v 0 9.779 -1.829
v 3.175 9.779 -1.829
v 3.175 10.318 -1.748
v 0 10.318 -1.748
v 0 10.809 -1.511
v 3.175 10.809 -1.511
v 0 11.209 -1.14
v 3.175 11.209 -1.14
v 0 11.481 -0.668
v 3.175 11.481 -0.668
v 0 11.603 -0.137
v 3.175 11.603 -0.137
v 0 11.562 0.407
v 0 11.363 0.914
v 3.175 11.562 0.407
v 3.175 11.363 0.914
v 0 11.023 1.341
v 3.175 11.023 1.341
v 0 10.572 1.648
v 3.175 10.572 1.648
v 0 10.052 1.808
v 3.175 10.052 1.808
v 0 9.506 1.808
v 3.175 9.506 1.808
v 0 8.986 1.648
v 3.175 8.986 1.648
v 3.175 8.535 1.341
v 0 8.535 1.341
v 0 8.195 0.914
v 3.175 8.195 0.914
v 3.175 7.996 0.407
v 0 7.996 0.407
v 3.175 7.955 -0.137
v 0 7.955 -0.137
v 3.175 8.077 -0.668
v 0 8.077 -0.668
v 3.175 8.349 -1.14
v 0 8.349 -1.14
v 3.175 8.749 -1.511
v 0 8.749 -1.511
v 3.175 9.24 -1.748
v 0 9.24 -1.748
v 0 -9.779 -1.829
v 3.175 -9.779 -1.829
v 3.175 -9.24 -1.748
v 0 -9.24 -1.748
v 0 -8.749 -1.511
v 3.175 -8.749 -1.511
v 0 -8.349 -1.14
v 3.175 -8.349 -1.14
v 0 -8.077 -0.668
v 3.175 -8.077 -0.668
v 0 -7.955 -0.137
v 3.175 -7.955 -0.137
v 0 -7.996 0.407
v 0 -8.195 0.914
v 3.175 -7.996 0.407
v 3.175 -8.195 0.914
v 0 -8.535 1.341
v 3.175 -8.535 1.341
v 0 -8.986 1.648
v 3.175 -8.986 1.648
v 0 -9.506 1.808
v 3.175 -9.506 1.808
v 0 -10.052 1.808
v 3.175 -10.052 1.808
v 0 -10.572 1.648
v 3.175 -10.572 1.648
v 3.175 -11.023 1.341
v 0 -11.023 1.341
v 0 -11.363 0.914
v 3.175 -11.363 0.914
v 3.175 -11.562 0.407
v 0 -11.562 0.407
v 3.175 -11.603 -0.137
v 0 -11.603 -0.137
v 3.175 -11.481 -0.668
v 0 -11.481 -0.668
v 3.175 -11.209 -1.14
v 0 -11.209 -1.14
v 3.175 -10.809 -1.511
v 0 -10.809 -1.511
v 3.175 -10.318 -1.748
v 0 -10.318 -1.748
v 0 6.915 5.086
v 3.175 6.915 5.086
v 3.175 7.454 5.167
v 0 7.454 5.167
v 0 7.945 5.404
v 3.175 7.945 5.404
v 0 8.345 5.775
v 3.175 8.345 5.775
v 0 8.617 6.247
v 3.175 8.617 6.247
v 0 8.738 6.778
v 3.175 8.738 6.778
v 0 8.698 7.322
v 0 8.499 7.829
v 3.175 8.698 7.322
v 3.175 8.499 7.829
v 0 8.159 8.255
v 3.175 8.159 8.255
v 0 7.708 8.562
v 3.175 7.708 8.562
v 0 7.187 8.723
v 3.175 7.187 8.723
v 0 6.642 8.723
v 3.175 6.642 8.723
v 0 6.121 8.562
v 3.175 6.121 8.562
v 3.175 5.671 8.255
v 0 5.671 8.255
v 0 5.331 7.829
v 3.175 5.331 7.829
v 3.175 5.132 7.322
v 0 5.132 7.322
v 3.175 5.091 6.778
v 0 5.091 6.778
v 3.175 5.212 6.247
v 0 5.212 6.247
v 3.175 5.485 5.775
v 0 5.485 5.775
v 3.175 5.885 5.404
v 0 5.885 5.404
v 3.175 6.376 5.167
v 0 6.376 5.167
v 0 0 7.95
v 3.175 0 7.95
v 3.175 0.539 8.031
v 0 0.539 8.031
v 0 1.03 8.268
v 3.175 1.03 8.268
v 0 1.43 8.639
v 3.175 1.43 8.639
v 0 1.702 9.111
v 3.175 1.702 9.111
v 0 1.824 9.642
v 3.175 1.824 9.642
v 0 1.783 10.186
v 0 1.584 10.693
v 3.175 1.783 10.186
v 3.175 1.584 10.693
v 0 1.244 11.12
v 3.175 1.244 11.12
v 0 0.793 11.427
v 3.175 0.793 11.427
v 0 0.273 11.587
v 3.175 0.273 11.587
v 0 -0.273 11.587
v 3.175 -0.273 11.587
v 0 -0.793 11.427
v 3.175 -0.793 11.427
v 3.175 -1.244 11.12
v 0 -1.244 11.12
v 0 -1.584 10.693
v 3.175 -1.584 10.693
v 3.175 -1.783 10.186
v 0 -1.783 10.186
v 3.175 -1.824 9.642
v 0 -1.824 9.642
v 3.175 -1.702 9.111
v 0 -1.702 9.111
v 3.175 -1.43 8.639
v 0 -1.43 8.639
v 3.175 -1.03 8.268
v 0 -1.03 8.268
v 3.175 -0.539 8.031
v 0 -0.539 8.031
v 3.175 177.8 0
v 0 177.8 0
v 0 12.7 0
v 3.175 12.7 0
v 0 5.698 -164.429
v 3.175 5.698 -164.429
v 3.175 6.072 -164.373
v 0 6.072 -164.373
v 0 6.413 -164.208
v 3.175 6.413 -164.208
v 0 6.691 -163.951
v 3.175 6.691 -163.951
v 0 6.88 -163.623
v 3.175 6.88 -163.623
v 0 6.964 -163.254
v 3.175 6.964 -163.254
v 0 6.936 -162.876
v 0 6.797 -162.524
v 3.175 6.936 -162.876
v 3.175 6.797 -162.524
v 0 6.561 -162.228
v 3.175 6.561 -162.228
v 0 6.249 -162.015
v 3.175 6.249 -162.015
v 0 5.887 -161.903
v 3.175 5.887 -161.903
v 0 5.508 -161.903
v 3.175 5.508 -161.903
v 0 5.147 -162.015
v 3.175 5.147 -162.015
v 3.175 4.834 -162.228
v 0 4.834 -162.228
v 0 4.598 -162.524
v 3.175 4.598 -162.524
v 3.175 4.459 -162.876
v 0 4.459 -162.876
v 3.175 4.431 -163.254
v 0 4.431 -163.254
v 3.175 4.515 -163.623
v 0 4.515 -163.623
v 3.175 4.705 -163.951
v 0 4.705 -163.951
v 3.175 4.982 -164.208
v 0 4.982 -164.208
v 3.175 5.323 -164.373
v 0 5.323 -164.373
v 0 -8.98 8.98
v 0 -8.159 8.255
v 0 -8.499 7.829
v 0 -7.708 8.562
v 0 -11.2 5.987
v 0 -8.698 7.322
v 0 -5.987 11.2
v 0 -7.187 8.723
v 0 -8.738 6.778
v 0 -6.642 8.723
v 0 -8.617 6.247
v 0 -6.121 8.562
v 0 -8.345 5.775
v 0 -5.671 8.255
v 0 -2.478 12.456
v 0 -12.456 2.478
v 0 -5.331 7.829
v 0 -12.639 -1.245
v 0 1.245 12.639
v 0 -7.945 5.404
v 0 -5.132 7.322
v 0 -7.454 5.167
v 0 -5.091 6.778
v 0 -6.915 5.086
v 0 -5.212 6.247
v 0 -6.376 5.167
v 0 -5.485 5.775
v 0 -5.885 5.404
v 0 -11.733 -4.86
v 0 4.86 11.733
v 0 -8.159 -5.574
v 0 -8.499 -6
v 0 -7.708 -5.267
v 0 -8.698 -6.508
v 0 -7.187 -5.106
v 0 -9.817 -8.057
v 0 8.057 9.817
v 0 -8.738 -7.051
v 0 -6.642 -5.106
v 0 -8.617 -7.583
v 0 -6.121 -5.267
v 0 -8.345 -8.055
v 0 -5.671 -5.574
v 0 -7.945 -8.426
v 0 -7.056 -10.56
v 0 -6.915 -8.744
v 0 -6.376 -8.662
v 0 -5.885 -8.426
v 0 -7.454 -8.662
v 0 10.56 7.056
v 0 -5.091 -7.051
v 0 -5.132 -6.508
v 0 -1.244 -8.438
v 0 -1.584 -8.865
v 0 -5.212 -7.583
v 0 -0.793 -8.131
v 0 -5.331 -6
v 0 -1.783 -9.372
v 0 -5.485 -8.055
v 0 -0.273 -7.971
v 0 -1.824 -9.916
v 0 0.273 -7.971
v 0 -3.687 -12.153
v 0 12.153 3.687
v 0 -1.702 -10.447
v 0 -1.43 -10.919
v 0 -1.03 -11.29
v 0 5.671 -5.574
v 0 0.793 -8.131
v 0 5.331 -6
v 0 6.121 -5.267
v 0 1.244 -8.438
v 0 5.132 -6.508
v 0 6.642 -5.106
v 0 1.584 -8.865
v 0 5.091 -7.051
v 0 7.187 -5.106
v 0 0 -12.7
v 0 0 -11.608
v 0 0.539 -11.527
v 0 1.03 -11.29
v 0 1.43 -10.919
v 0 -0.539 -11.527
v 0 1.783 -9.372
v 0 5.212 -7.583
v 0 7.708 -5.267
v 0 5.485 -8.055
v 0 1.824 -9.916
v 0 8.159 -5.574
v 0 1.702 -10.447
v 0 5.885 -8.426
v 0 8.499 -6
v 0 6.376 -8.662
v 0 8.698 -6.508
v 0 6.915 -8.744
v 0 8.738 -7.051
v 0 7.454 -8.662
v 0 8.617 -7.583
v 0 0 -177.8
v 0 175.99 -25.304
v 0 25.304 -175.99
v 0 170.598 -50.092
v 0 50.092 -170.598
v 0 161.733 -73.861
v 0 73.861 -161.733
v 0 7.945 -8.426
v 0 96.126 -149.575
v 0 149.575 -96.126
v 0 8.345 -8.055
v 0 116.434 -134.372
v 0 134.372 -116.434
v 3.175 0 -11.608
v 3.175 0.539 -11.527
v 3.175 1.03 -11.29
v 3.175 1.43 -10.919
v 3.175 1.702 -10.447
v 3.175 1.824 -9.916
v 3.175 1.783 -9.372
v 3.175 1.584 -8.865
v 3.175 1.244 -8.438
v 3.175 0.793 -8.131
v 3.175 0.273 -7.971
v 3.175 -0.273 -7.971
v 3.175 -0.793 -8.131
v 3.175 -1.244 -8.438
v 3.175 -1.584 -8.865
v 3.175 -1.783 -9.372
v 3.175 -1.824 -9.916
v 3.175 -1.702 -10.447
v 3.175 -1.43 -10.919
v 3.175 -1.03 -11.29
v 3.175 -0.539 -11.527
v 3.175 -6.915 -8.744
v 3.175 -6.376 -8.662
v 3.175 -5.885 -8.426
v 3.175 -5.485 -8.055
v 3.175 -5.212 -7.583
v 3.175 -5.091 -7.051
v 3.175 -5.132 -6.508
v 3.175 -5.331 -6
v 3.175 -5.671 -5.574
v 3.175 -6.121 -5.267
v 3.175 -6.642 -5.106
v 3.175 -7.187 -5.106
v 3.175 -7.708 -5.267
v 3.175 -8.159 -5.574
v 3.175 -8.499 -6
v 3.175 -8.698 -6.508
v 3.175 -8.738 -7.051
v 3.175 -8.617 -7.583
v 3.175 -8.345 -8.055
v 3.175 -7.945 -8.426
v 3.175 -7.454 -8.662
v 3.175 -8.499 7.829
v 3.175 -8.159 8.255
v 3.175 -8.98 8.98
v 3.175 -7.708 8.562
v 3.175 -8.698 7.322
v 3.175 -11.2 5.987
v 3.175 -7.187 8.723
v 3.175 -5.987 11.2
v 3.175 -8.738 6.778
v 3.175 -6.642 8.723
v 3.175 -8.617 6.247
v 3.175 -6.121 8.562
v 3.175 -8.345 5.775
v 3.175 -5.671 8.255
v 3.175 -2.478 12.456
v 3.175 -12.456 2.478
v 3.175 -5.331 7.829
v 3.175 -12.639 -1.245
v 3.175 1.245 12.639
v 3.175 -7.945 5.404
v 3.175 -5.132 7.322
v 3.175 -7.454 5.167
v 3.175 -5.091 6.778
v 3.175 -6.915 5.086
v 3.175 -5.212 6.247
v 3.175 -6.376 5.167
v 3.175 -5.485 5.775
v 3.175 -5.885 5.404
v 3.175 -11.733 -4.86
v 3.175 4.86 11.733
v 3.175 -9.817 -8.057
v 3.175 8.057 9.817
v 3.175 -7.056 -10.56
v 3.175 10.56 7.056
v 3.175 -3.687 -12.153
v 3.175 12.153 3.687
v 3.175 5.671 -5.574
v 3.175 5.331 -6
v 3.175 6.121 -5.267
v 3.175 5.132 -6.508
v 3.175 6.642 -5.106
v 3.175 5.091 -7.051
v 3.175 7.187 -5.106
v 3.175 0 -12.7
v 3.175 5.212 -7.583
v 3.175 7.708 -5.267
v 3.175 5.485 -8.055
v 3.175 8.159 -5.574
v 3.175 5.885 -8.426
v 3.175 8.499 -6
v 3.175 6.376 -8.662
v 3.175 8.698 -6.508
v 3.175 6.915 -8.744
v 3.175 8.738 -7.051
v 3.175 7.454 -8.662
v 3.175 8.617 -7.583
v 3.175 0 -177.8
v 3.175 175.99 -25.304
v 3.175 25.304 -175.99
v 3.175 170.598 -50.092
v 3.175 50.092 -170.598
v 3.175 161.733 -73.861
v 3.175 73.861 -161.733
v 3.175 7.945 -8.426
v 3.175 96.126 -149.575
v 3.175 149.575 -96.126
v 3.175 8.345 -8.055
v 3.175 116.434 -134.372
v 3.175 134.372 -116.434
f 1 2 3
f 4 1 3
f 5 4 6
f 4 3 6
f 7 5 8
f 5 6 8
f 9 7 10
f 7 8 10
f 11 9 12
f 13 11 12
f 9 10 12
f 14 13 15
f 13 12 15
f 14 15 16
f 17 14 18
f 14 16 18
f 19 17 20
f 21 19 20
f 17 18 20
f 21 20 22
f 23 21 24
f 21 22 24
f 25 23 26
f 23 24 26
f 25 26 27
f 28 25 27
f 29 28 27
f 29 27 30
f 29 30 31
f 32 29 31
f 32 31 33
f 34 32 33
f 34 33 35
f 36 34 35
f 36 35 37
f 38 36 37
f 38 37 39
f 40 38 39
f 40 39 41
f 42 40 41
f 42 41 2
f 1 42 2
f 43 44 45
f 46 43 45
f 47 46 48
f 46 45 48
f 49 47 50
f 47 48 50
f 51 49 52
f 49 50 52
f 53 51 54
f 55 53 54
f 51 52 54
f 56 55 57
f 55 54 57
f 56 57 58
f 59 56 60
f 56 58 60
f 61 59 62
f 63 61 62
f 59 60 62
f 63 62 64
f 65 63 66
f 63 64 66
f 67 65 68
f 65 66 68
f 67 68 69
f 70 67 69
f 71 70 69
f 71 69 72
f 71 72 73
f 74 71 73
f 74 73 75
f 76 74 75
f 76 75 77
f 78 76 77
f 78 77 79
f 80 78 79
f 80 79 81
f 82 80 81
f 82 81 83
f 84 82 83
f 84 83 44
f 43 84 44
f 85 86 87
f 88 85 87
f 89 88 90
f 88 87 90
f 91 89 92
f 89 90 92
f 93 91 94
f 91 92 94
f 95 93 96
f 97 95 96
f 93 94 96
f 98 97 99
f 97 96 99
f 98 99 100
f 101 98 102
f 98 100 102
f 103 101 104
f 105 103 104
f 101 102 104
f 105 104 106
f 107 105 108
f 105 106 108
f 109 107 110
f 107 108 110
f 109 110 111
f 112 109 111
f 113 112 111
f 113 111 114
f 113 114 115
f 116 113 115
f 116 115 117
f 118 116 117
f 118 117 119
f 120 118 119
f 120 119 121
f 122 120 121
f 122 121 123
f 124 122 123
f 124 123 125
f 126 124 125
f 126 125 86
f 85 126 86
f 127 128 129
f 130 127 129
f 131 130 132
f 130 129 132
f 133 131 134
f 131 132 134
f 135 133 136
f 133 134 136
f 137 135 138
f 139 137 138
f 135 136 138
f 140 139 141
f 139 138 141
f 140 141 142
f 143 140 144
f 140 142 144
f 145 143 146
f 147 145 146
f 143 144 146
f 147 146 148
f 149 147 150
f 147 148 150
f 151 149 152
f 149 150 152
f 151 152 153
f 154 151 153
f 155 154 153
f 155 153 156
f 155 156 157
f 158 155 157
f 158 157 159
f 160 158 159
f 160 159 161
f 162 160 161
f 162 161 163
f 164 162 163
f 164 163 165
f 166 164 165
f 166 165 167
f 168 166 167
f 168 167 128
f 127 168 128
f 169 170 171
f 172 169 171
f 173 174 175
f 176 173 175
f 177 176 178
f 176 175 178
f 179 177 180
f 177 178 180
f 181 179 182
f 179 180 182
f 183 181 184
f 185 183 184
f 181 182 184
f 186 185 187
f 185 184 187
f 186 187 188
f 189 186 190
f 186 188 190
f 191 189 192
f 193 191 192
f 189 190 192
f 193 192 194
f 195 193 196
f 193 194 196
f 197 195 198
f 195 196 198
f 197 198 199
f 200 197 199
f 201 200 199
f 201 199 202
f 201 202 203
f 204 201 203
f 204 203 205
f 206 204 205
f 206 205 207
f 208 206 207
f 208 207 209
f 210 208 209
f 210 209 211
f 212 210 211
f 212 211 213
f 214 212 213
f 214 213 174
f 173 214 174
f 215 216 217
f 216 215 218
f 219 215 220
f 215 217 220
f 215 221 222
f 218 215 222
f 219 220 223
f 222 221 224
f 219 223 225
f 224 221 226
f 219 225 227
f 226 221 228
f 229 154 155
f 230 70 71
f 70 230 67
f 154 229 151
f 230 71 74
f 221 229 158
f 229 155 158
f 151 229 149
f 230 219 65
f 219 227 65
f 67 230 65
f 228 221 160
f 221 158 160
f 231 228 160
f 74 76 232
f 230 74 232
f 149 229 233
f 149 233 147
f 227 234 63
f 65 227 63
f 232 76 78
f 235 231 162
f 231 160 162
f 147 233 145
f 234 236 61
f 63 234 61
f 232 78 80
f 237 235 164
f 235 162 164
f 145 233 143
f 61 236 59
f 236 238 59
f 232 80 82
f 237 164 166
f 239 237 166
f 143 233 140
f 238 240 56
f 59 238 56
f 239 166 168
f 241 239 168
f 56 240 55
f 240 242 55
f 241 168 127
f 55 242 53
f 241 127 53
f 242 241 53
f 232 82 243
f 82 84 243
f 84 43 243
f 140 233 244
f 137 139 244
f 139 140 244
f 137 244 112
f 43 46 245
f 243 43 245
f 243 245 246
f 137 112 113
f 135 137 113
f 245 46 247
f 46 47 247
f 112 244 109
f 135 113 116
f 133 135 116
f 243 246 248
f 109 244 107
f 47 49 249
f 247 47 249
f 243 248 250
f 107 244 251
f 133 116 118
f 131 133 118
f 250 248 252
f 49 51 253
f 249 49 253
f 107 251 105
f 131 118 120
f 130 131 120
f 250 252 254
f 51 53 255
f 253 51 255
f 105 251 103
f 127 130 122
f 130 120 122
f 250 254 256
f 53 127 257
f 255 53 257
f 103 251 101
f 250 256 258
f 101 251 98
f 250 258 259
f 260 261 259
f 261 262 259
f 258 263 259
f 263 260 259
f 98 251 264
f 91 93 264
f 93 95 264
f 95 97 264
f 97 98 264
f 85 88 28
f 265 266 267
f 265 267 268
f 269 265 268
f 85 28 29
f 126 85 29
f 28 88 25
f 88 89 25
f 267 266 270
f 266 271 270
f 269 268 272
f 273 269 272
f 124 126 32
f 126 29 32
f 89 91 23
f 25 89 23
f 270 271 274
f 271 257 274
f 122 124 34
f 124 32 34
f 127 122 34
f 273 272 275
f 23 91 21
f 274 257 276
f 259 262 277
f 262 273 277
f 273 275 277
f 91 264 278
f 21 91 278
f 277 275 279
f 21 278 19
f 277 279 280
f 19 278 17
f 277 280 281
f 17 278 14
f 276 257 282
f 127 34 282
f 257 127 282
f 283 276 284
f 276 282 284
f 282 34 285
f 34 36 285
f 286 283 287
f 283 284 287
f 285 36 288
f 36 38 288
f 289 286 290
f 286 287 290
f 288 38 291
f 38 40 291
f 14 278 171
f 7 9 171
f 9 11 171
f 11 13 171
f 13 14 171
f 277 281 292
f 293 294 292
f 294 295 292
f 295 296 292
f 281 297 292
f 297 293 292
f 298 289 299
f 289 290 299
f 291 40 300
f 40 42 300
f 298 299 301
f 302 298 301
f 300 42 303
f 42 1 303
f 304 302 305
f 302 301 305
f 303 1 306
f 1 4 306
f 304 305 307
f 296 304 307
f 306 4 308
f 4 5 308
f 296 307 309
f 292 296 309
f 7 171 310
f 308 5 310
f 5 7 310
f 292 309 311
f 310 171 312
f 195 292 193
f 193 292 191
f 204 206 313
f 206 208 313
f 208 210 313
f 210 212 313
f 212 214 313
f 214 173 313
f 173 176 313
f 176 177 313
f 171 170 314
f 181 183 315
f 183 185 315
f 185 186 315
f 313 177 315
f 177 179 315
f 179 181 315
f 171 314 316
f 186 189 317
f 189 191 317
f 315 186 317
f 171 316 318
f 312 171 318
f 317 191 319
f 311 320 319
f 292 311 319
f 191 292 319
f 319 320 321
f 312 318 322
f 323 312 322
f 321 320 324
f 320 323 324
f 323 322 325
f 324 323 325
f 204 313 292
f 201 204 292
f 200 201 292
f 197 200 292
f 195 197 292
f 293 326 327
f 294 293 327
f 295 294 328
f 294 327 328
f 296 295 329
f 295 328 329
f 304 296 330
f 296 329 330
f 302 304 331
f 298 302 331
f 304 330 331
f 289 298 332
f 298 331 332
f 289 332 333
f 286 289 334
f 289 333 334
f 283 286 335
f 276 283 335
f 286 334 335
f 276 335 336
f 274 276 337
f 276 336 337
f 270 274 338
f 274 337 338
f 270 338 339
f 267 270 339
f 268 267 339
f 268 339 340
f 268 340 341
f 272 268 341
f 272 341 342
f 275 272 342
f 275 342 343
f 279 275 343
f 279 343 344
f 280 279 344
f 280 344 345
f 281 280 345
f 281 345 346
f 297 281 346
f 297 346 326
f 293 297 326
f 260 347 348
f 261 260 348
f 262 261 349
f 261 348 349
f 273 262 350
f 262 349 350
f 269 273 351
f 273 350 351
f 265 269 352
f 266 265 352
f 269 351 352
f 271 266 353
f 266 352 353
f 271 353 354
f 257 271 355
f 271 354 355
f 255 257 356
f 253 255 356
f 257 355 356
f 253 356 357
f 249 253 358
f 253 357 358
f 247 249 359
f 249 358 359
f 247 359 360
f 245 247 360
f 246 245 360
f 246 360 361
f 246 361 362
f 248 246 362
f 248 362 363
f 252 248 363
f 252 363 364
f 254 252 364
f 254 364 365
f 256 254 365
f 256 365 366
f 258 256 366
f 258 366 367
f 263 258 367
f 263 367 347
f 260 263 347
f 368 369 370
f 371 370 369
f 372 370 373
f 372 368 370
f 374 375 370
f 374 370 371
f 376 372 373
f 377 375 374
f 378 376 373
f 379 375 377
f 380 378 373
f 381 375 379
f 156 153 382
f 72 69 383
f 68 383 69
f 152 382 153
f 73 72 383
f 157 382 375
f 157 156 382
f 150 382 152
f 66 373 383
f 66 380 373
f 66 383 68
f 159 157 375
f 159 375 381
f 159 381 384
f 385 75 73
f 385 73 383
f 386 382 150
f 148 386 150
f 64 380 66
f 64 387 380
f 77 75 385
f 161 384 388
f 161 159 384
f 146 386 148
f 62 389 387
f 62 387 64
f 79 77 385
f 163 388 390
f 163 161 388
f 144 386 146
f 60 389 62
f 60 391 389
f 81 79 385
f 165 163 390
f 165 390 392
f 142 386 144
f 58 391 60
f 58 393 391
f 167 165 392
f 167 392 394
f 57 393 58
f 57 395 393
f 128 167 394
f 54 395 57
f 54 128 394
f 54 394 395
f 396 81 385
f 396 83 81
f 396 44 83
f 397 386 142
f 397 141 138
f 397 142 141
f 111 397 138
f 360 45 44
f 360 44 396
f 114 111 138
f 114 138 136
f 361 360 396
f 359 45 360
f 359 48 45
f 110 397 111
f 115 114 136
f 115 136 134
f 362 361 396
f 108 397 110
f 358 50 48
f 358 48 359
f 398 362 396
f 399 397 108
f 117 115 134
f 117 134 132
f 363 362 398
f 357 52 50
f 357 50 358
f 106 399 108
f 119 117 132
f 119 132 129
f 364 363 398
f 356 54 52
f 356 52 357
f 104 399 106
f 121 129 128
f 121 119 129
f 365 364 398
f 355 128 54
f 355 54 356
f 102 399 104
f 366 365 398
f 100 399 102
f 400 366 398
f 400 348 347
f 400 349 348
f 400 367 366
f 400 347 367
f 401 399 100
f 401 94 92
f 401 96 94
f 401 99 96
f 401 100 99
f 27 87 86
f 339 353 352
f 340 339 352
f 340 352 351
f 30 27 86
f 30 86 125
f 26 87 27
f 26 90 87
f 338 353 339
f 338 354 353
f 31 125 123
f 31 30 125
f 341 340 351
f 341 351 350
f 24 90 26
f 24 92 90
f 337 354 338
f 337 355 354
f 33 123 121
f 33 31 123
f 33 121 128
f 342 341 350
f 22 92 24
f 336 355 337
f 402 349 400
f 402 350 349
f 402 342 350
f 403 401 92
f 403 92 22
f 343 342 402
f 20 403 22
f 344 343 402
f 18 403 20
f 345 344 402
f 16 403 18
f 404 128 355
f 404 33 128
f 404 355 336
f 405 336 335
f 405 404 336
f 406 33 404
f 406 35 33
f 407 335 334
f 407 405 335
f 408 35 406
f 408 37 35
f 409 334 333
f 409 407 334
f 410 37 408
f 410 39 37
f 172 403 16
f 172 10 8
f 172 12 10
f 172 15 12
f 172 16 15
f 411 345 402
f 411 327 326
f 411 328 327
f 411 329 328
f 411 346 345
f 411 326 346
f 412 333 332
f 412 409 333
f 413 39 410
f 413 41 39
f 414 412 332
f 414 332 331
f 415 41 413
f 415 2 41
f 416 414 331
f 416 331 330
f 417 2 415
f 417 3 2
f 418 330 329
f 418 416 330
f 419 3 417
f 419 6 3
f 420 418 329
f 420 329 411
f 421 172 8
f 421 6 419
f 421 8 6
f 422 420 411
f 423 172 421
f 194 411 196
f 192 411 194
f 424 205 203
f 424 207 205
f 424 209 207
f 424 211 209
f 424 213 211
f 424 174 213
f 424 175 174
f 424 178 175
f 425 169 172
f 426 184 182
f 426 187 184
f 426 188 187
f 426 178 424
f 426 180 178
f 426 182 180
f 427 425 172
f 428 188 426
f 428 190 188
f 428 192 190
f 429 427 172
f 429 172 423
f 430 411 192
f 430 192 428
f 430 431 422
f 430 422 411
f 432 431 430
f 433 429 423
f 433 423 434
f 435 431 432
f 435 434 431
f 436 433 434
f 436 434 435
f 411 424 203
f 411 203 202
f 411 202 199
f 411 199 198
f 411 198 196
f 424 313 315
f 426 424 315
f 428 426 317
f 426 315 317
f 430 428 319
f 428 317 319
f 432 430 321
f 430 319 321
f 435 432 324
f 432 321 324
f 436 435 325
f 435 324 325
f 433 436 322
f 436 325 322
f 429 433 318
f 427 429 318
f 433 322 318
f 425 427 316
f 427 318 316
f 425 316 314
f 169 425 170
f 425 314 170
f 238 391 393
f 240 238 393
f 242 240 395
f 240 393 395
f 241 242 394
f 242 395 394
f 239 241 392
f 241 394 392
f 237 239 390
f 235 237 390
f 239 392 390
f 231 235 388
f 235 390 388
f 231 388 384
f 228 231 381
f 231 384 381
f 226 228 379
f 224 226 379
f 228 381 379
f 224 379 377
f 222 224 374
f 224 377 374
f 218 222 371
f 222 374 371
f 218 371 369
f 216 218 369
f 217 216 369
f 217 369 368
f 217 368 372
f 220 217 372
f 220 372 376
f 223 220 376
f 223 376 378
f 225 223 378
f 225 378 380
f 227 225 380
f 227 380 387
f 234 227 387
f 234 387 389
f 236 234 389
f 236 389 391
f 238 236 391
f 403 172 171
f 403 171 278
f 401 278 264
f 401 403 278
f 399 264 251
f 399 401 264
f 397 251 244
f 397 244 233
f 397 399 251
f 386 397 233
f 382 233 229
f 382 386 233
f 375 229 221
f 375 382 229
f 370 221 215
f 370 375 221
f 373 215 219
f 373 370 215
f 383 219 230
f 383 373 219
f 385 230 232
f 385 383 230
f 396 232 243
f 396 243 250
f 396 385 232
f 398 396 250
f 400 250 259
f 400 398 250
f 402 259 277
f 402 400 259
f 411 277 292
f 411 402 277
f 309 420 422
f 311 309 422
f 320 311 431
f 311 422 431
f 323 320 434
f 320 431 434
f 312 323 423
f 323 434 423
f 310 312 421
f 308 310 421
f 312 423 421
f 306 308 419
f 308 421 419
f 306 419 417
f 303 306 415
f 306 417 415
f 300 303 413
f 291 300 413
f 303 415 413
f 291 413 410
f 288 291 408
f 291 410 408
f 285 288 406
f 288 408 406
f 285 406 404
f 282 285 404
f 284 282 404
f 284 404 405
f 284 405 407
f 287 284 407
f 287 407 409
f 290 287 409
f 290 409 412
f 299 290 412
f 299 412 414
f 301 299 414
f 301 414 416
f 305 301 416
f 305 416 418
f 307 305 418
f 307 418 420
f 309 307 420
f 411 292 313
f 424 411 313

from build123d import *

# Parameters (mm, degrees)
BOSS_EXTRUDE1_DEPTH = 3.175
BOSS_EXTRUDE2_DEPTH = 3.175
SKETCH3_R           = 1.8288
CUT_EXTRUDE1_DEPTH  = 4.175
SKETCH5_R           = 1.27
CUT_EXTRUDE2_DEPTH  = 4.175


with BuildPart() as part:
    # Sketch1 → Boss-Extrude1 (new body)
    with BuildSketch(Plane(origin=(0, 0, 0), x_dir=(0, 0, -1), z_dir=(1, 0, 0))):
        with BuildLine():
            Line((0, 177.8), (0, 0))
            Line((0, 0), (177.8, 0))
            ThreePointArc((177.8, 0), (125.723585695, 125.723585695), (0, 177.8))
        make_face()
    extrude(amount=BOSS_EXTRUDE1_DEPTH)

    # Sketch2 → Boss-Extrude2 (add)
    with BuildSketch(Plane(origin=(3.175, 0, 0), x_dir=(0, 0, -1), z_dir=(1, 0, 0))):
        with BuildLine():
            Line((0, 0), (0, 12.7))
            ThreePointArc((0, 12.7), (-8.980256121, -8.980256121), (12.7, 0))
            Line((12.7, 0), (0, 0))
        make_face()
    extrude(amount=-BOSS_EXTRUDE2_DEPTH)

    # Sketch3 → Cut-Extrude1 (cut, through all)
    with BuildSketch(Plane(origin=(3.175, 0, 0), x_dir=(0, 0, -1), z_dir=(1, 0, 0))):
        with Locations((0, 9.779)):
            Circle(SKETCH3_R)
        with Locations((6.914797213, 6.914797213)):
            Circle(SKETCH3_R)
        with Locations((9.779, 0)):
            Circle(SKETCH3_R)
        with Locations((6.914797213, -6.914797213)):
            Circle(SKETCH3_R)
        with Locations((0, -9.779)):
            Circle(SKETCH3_R)
        with Locations((-6.914797213, -6.914797213)):
            Circle(SKETCH3_R)
        with Locations((-9.779, 0)):
            Circle(SKETCH3_R)
        with Locations((-6.914797213, 6.914797213)):
            Circle(SKETCH3_R)
    extrude(amount=-CUT_EXTRUDE1_DEPTH, mode=Mode.SUBTRACT)

    # Sketch5 → Cut-Extrude2 (cut, through all)
    with BuildSketch(Plane(origin=(3.175, 0, 0), x_dir=(0, 0, -1), z_dir=(1, 0, 0))):
        with Locations((163.159047333, 5.697639482)):
            Circle(SKETCH5_R)
    extrude(amount=-CUT_EXTRUDE2_DEPTH, mode=Mode.SUBTRACT)


solid = part.part
